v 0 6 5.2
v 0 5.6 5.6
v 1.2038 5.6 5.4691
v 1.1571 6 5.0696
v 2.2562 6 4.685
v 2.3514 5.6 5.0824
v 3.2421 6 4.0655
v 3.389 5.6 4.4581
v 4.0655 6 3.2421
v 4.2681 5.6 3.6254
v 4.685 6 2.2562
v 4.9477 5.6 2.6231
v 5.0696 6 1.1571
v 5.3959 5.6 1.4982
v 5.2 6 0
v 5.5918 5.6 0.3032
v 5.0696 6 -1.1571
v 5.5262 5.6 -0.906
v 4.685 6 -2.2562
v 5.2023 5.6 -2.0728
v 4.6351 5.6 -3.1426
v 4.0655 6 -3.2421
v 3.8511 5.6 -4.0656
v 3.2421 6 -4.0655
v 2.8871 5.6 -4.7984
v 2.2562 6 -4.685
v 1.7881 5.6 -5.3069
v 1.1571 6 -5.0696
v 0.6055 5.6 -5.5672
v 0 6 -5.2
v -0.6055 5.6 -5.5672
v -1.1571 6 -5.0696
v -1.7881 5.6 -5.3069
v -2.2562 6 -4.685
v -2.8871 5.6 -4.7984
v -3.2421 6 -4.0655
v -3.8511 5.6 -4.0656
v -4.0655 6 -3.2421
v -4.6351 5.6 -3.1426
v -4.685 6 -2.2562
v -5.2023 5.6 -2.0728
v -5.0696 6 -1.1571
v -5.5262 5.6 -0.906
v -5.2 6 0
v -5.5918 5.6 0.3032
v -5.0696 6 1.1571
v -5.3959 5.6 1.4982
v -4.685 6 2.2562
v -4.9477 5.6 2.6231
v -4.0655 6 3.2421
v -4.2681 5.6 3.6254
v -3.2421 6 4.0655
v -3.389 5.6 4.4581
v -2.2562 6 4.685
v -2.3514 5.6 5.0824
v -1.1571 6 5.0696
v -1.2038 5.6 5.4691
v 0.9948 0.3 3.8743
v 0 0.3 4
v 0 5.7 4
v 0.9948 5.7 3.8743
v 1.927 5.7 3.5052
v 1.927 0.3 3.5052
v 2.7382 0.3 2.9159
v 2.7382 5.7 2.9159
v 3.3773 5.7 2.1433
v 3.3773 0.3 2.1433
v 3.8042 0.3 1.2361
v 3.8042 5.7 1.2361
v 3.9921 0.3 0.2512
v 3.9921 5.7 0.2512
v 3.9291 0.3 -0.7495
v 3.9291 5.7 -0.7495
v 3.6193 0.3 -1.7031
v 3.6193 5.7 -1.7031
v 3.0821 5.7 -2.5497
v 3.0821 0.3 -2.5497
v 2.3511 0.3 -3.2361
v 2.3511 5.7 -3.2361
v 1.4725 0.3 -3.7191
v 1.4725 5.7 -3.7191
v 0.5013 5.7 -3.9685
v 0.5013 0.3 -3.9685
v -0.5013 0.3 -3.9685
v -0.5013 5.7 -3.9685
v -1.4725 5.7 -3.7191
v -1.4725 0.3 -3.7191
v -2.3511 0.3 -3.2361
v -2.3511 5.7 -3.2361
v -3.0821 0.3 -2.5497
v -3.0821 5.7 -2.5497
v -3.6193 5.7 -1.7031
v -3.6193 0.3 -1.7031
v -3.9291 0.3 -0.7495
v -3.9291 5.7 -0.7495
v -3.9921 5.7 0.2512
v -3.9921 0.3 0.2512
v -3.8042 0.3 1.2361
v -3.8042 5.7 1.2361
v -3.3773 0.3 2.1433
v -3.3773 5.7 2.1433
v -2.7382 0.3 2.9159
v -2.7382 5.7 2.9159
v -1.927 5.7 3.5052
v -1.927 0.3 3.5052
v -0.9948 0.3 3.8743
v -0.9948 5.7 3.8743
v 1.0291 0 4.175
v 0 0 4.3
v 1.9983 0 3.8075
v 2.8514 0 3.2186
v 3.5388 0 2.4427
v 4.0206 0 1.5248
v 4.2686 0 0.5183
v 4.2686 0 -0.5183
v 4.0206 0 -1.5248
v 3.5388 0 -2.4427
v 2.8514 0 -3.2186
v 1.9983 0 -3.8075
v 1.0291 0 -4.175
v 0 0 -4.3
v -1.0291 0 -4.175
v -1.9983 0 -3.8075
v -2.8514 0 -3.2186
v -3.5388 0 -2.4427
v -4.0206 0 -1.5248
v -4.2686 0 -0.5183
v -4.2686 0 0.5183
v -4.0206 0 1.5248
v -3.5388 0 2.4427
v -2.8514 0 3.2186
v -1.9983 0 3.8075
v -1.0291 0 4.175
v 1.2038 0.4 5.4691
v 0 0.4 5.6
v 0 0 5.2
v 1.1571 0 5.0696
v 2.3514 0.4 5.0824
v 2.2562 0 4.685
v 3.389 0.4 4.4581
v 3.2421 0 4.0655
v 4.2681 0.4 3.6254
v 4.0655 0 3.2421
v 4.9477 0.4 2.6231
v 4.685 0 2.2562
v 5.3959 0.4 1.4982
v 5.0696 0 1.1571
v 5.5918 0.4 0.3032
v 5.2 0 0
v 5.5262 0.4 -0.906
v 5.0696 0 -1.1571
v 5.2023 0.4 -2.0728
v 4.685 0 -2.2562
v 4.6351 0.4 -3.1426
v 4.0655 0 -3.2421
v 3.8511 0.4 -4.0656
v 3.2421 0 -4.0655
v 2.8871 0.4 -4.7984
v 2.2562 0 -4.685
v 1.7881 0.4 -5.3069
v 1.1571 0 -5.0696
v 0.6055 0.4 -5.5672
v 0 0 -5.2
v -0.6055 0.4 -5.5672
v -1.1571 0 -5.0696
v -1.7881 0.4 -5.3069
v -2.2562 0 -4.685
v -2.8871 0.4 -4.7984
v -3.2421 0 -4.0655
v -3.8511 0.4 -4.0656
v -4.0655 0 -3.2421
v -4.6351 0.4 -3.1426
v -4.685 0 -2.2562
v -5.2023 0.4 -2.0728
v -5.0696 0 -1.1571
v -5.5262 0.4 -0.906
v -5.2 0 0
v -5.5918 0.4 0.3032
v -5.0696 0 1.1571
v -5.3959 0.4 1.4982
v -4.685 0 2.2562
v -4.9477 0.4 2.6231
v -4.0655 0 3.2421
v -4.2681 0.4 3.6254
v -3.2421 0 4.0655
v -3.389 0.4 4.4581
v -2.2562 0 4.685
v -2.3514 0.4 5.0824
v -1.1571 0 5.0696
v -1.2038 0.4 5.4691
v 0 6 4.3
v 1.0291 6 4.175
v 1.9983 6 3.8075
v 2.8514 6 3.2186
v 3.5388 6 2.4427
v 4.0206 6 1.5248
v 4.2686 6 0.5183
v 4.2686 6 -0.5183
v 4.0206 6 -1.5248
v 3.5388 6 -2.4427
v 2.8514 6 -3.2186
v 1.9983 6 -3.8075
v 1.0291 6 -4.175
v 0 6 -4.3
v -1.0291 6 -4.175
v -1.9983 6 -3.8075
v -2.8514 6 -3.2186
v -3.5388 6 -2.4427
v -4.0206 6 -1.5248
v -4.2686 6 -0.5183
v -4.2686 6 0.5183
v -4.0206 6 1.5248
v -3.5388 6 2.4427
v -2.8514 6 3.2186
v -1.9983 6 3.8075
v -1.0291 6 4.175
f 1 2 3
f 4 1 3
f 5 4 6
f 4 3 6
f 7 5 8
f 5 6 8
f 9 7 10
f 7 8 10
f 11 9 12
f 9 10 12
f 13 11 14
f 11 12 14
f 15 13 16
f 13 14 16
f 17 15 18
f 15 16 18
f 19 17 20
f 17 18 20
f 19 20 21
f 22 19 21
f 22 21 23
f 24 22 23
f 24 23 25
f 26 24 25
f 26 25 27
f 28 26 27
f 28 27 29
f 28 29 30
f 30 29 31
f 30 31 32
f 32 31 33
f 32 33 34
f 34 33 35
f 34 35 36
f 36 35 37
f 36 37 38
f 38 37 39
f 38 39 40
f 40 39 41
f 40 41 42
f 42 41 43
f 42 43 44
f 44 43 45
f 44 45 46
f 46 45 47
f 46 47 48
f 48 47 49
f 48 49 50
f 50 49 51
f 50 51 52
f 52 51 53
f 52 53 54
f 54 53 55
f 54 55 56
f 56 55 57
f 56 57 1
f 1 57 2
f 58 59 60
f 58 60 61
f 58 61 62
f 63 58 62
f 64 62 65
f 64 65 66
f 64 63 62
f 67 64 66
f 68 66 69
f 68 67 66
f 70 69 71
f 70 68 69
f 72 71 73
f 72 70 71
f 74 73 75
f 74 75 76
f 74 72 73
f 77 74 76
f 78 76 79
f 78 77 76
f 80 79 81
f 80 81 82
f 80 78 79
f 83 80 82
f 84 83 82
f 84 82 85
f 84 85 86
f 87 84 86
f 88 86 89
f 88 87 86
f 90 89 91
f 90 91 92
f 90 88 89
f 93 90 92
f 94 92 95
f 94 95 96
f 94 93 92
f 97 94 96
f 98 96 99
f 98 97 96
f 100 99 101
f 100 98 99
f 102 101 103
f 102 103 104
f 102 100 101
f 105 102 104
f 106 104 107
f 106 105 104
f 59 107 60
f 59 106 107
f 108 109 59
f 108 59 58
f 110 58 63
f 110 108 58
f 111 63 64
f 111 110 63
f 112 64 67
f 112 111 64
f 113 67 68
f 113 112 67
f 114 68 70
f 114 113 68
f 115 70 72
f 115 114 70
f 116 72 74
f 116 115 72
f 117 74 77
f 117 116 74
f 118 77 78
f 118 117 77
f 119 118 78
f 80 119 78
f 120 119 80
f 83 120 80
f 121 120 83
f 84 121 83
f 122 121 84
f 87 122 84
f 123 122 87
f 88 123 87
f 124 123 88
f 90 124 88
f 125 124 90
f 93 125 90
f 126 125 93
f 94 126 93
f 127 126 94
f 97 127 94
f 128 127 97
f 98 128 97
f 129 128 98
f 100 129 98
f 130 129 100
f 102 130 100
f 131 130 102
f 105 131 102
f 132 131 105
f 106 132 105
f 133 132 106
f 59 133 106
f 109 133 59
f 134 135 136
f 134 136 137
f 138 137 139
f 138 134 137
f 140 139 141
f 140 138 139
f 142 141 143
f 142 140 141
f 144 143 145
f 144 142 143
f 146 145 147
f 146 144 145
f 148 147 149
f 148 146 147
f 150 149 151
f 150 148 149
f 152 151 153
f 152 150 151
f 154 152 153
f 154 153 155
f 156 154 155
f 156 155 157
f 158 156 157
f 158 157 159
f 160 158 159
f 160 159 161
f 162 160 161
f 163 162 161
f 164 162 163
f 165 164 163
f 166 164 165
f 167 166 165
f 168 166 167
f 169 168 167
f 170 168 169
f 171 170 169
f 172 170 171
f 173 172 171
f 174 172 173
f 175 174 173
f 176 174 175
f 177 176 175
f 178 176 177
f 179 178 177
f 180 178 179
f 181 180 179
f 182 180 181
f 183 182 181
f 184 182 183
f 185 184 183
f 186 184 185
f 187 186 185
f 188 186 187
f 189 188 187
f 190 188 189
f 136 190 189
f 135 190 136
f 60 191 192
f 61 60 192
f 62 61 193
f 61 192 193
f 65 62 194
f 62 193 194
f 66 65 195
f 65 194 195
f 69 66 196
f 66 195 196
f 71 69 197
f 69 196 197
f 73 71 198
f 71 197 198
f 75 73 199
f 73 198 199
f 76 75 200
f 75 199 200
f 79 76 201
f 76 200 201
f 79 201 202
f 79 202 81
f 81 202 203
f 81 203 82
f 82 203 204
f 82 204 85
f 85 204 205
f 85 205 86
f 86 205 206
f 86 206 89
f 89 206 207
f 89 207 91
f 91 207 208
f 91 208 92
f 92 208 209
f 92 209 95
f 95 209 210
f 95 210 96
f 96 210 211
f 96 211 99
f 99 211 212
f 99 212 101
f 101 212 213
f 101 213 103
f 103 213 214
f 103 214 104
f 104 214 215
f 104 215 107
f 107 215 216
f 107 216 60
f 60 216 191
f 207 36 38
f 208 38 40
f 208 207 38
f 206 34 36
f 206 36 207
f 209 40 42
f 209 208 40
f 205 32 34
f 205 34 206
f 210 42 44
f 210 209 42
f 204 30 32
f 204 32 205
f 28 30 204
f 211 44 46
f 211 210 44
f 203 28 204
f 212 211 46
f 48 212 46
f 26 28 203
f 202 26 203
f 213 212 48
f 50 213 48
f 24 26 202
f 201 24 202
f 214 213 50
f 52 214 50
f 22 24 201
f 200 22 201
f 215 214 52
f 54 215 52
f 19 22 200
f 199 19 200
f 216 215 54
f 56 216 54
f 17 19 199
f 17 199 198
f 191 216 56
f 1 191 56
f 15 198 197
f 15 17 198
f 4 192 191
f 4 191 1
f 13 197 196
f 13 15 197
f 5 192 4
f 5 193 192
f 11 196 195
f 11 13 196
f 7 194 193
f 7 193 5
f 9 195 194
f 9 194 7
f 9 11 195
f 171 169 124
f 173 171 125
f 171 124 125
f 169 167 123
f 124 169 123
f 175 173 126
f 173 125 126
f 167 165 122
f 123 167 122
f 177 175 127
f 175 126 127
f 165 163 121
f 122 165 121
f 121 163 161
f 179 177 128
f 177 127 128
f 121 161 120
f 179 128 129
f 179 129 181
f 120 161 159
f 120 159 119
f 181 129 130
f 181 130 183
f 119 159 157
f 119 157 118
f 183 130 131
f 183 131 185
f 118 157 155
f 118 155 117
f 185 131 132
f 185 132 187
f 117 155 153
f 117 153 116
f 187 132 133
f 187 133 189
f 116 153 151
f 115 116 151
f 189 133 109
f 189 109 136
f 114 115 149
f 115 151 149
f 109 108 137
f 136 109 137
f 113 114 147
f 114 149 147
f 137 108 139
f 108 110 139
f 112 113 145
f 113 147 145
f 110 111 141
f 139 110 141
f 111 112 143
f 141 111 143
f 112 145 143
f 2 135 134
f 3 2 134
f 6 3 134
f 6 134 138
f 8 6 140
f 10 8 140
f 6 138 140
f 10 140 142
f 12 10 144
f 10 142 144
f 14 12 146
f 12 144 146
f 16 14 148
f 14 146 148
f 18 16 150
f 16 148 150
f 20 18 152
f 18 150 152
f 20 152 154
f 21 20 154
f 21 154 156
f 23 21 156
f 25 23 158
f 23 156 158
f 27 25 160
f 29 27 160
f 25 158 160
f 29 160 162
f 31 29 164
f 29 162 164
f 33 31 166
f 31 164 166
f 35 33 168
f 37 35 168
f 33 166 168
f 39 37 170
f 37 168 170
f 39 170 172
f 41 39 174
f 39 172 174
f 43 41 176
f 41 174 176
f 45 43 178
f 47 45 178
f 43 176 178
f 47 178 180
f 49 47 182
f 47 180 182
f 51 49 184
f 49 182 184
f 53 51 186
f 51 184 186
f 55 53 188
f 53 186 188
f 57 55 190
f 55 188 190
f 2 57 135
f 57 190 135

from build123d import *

# Parameters (mm, degrees)
SKETCH_1_R      = 5.6
SKETCH_1_R_2    = 4
EXTRUDE_1_DEPTH = 6
CHAMFER_1_SIZE  = 0.3
CHAMFER_2_SIZE  = 0.4


with BuildPart() as part:
    # Эскиз1 → Бобышка-Вытянуть1 (new body)
    with BuildSketch(Plane(origin=(0, 0, 0), x_dir=(1, 0, 0), z_dir=(0, 1, 0))):
        with Locations(Location((0, 0, 0), (0, 0, 270))):
            Circle(SKETCH_1_R)
        with Locations(Location((0, 0, 0), (0, 0, 270))):
            Circle(SKETCH_1_R_2, mode=Mode.SUBTRACT)
    extrude(amount=EXTRUDE_1_DEPTH)

    # Фаска1
    chamfer_1_edges = [part.edges().sort_by_distance(p)[0] for p in [
        (0, 0, -4),
        (0, 6, -4),
    ]]
    chamfer(chamfer_1_edges, length=CHAMFER_1_SIZE)

    # Фаска2
    chamfer_2_edges = [part.edges().sort_by_distance(p)[0] for p in [
        (0, 0, -5.6),
        (0, 6, -5.6),
    ]]
    chamfer(chamfer_2_edges, length=CHAMFER_2_SIZE)


solid = part.part
